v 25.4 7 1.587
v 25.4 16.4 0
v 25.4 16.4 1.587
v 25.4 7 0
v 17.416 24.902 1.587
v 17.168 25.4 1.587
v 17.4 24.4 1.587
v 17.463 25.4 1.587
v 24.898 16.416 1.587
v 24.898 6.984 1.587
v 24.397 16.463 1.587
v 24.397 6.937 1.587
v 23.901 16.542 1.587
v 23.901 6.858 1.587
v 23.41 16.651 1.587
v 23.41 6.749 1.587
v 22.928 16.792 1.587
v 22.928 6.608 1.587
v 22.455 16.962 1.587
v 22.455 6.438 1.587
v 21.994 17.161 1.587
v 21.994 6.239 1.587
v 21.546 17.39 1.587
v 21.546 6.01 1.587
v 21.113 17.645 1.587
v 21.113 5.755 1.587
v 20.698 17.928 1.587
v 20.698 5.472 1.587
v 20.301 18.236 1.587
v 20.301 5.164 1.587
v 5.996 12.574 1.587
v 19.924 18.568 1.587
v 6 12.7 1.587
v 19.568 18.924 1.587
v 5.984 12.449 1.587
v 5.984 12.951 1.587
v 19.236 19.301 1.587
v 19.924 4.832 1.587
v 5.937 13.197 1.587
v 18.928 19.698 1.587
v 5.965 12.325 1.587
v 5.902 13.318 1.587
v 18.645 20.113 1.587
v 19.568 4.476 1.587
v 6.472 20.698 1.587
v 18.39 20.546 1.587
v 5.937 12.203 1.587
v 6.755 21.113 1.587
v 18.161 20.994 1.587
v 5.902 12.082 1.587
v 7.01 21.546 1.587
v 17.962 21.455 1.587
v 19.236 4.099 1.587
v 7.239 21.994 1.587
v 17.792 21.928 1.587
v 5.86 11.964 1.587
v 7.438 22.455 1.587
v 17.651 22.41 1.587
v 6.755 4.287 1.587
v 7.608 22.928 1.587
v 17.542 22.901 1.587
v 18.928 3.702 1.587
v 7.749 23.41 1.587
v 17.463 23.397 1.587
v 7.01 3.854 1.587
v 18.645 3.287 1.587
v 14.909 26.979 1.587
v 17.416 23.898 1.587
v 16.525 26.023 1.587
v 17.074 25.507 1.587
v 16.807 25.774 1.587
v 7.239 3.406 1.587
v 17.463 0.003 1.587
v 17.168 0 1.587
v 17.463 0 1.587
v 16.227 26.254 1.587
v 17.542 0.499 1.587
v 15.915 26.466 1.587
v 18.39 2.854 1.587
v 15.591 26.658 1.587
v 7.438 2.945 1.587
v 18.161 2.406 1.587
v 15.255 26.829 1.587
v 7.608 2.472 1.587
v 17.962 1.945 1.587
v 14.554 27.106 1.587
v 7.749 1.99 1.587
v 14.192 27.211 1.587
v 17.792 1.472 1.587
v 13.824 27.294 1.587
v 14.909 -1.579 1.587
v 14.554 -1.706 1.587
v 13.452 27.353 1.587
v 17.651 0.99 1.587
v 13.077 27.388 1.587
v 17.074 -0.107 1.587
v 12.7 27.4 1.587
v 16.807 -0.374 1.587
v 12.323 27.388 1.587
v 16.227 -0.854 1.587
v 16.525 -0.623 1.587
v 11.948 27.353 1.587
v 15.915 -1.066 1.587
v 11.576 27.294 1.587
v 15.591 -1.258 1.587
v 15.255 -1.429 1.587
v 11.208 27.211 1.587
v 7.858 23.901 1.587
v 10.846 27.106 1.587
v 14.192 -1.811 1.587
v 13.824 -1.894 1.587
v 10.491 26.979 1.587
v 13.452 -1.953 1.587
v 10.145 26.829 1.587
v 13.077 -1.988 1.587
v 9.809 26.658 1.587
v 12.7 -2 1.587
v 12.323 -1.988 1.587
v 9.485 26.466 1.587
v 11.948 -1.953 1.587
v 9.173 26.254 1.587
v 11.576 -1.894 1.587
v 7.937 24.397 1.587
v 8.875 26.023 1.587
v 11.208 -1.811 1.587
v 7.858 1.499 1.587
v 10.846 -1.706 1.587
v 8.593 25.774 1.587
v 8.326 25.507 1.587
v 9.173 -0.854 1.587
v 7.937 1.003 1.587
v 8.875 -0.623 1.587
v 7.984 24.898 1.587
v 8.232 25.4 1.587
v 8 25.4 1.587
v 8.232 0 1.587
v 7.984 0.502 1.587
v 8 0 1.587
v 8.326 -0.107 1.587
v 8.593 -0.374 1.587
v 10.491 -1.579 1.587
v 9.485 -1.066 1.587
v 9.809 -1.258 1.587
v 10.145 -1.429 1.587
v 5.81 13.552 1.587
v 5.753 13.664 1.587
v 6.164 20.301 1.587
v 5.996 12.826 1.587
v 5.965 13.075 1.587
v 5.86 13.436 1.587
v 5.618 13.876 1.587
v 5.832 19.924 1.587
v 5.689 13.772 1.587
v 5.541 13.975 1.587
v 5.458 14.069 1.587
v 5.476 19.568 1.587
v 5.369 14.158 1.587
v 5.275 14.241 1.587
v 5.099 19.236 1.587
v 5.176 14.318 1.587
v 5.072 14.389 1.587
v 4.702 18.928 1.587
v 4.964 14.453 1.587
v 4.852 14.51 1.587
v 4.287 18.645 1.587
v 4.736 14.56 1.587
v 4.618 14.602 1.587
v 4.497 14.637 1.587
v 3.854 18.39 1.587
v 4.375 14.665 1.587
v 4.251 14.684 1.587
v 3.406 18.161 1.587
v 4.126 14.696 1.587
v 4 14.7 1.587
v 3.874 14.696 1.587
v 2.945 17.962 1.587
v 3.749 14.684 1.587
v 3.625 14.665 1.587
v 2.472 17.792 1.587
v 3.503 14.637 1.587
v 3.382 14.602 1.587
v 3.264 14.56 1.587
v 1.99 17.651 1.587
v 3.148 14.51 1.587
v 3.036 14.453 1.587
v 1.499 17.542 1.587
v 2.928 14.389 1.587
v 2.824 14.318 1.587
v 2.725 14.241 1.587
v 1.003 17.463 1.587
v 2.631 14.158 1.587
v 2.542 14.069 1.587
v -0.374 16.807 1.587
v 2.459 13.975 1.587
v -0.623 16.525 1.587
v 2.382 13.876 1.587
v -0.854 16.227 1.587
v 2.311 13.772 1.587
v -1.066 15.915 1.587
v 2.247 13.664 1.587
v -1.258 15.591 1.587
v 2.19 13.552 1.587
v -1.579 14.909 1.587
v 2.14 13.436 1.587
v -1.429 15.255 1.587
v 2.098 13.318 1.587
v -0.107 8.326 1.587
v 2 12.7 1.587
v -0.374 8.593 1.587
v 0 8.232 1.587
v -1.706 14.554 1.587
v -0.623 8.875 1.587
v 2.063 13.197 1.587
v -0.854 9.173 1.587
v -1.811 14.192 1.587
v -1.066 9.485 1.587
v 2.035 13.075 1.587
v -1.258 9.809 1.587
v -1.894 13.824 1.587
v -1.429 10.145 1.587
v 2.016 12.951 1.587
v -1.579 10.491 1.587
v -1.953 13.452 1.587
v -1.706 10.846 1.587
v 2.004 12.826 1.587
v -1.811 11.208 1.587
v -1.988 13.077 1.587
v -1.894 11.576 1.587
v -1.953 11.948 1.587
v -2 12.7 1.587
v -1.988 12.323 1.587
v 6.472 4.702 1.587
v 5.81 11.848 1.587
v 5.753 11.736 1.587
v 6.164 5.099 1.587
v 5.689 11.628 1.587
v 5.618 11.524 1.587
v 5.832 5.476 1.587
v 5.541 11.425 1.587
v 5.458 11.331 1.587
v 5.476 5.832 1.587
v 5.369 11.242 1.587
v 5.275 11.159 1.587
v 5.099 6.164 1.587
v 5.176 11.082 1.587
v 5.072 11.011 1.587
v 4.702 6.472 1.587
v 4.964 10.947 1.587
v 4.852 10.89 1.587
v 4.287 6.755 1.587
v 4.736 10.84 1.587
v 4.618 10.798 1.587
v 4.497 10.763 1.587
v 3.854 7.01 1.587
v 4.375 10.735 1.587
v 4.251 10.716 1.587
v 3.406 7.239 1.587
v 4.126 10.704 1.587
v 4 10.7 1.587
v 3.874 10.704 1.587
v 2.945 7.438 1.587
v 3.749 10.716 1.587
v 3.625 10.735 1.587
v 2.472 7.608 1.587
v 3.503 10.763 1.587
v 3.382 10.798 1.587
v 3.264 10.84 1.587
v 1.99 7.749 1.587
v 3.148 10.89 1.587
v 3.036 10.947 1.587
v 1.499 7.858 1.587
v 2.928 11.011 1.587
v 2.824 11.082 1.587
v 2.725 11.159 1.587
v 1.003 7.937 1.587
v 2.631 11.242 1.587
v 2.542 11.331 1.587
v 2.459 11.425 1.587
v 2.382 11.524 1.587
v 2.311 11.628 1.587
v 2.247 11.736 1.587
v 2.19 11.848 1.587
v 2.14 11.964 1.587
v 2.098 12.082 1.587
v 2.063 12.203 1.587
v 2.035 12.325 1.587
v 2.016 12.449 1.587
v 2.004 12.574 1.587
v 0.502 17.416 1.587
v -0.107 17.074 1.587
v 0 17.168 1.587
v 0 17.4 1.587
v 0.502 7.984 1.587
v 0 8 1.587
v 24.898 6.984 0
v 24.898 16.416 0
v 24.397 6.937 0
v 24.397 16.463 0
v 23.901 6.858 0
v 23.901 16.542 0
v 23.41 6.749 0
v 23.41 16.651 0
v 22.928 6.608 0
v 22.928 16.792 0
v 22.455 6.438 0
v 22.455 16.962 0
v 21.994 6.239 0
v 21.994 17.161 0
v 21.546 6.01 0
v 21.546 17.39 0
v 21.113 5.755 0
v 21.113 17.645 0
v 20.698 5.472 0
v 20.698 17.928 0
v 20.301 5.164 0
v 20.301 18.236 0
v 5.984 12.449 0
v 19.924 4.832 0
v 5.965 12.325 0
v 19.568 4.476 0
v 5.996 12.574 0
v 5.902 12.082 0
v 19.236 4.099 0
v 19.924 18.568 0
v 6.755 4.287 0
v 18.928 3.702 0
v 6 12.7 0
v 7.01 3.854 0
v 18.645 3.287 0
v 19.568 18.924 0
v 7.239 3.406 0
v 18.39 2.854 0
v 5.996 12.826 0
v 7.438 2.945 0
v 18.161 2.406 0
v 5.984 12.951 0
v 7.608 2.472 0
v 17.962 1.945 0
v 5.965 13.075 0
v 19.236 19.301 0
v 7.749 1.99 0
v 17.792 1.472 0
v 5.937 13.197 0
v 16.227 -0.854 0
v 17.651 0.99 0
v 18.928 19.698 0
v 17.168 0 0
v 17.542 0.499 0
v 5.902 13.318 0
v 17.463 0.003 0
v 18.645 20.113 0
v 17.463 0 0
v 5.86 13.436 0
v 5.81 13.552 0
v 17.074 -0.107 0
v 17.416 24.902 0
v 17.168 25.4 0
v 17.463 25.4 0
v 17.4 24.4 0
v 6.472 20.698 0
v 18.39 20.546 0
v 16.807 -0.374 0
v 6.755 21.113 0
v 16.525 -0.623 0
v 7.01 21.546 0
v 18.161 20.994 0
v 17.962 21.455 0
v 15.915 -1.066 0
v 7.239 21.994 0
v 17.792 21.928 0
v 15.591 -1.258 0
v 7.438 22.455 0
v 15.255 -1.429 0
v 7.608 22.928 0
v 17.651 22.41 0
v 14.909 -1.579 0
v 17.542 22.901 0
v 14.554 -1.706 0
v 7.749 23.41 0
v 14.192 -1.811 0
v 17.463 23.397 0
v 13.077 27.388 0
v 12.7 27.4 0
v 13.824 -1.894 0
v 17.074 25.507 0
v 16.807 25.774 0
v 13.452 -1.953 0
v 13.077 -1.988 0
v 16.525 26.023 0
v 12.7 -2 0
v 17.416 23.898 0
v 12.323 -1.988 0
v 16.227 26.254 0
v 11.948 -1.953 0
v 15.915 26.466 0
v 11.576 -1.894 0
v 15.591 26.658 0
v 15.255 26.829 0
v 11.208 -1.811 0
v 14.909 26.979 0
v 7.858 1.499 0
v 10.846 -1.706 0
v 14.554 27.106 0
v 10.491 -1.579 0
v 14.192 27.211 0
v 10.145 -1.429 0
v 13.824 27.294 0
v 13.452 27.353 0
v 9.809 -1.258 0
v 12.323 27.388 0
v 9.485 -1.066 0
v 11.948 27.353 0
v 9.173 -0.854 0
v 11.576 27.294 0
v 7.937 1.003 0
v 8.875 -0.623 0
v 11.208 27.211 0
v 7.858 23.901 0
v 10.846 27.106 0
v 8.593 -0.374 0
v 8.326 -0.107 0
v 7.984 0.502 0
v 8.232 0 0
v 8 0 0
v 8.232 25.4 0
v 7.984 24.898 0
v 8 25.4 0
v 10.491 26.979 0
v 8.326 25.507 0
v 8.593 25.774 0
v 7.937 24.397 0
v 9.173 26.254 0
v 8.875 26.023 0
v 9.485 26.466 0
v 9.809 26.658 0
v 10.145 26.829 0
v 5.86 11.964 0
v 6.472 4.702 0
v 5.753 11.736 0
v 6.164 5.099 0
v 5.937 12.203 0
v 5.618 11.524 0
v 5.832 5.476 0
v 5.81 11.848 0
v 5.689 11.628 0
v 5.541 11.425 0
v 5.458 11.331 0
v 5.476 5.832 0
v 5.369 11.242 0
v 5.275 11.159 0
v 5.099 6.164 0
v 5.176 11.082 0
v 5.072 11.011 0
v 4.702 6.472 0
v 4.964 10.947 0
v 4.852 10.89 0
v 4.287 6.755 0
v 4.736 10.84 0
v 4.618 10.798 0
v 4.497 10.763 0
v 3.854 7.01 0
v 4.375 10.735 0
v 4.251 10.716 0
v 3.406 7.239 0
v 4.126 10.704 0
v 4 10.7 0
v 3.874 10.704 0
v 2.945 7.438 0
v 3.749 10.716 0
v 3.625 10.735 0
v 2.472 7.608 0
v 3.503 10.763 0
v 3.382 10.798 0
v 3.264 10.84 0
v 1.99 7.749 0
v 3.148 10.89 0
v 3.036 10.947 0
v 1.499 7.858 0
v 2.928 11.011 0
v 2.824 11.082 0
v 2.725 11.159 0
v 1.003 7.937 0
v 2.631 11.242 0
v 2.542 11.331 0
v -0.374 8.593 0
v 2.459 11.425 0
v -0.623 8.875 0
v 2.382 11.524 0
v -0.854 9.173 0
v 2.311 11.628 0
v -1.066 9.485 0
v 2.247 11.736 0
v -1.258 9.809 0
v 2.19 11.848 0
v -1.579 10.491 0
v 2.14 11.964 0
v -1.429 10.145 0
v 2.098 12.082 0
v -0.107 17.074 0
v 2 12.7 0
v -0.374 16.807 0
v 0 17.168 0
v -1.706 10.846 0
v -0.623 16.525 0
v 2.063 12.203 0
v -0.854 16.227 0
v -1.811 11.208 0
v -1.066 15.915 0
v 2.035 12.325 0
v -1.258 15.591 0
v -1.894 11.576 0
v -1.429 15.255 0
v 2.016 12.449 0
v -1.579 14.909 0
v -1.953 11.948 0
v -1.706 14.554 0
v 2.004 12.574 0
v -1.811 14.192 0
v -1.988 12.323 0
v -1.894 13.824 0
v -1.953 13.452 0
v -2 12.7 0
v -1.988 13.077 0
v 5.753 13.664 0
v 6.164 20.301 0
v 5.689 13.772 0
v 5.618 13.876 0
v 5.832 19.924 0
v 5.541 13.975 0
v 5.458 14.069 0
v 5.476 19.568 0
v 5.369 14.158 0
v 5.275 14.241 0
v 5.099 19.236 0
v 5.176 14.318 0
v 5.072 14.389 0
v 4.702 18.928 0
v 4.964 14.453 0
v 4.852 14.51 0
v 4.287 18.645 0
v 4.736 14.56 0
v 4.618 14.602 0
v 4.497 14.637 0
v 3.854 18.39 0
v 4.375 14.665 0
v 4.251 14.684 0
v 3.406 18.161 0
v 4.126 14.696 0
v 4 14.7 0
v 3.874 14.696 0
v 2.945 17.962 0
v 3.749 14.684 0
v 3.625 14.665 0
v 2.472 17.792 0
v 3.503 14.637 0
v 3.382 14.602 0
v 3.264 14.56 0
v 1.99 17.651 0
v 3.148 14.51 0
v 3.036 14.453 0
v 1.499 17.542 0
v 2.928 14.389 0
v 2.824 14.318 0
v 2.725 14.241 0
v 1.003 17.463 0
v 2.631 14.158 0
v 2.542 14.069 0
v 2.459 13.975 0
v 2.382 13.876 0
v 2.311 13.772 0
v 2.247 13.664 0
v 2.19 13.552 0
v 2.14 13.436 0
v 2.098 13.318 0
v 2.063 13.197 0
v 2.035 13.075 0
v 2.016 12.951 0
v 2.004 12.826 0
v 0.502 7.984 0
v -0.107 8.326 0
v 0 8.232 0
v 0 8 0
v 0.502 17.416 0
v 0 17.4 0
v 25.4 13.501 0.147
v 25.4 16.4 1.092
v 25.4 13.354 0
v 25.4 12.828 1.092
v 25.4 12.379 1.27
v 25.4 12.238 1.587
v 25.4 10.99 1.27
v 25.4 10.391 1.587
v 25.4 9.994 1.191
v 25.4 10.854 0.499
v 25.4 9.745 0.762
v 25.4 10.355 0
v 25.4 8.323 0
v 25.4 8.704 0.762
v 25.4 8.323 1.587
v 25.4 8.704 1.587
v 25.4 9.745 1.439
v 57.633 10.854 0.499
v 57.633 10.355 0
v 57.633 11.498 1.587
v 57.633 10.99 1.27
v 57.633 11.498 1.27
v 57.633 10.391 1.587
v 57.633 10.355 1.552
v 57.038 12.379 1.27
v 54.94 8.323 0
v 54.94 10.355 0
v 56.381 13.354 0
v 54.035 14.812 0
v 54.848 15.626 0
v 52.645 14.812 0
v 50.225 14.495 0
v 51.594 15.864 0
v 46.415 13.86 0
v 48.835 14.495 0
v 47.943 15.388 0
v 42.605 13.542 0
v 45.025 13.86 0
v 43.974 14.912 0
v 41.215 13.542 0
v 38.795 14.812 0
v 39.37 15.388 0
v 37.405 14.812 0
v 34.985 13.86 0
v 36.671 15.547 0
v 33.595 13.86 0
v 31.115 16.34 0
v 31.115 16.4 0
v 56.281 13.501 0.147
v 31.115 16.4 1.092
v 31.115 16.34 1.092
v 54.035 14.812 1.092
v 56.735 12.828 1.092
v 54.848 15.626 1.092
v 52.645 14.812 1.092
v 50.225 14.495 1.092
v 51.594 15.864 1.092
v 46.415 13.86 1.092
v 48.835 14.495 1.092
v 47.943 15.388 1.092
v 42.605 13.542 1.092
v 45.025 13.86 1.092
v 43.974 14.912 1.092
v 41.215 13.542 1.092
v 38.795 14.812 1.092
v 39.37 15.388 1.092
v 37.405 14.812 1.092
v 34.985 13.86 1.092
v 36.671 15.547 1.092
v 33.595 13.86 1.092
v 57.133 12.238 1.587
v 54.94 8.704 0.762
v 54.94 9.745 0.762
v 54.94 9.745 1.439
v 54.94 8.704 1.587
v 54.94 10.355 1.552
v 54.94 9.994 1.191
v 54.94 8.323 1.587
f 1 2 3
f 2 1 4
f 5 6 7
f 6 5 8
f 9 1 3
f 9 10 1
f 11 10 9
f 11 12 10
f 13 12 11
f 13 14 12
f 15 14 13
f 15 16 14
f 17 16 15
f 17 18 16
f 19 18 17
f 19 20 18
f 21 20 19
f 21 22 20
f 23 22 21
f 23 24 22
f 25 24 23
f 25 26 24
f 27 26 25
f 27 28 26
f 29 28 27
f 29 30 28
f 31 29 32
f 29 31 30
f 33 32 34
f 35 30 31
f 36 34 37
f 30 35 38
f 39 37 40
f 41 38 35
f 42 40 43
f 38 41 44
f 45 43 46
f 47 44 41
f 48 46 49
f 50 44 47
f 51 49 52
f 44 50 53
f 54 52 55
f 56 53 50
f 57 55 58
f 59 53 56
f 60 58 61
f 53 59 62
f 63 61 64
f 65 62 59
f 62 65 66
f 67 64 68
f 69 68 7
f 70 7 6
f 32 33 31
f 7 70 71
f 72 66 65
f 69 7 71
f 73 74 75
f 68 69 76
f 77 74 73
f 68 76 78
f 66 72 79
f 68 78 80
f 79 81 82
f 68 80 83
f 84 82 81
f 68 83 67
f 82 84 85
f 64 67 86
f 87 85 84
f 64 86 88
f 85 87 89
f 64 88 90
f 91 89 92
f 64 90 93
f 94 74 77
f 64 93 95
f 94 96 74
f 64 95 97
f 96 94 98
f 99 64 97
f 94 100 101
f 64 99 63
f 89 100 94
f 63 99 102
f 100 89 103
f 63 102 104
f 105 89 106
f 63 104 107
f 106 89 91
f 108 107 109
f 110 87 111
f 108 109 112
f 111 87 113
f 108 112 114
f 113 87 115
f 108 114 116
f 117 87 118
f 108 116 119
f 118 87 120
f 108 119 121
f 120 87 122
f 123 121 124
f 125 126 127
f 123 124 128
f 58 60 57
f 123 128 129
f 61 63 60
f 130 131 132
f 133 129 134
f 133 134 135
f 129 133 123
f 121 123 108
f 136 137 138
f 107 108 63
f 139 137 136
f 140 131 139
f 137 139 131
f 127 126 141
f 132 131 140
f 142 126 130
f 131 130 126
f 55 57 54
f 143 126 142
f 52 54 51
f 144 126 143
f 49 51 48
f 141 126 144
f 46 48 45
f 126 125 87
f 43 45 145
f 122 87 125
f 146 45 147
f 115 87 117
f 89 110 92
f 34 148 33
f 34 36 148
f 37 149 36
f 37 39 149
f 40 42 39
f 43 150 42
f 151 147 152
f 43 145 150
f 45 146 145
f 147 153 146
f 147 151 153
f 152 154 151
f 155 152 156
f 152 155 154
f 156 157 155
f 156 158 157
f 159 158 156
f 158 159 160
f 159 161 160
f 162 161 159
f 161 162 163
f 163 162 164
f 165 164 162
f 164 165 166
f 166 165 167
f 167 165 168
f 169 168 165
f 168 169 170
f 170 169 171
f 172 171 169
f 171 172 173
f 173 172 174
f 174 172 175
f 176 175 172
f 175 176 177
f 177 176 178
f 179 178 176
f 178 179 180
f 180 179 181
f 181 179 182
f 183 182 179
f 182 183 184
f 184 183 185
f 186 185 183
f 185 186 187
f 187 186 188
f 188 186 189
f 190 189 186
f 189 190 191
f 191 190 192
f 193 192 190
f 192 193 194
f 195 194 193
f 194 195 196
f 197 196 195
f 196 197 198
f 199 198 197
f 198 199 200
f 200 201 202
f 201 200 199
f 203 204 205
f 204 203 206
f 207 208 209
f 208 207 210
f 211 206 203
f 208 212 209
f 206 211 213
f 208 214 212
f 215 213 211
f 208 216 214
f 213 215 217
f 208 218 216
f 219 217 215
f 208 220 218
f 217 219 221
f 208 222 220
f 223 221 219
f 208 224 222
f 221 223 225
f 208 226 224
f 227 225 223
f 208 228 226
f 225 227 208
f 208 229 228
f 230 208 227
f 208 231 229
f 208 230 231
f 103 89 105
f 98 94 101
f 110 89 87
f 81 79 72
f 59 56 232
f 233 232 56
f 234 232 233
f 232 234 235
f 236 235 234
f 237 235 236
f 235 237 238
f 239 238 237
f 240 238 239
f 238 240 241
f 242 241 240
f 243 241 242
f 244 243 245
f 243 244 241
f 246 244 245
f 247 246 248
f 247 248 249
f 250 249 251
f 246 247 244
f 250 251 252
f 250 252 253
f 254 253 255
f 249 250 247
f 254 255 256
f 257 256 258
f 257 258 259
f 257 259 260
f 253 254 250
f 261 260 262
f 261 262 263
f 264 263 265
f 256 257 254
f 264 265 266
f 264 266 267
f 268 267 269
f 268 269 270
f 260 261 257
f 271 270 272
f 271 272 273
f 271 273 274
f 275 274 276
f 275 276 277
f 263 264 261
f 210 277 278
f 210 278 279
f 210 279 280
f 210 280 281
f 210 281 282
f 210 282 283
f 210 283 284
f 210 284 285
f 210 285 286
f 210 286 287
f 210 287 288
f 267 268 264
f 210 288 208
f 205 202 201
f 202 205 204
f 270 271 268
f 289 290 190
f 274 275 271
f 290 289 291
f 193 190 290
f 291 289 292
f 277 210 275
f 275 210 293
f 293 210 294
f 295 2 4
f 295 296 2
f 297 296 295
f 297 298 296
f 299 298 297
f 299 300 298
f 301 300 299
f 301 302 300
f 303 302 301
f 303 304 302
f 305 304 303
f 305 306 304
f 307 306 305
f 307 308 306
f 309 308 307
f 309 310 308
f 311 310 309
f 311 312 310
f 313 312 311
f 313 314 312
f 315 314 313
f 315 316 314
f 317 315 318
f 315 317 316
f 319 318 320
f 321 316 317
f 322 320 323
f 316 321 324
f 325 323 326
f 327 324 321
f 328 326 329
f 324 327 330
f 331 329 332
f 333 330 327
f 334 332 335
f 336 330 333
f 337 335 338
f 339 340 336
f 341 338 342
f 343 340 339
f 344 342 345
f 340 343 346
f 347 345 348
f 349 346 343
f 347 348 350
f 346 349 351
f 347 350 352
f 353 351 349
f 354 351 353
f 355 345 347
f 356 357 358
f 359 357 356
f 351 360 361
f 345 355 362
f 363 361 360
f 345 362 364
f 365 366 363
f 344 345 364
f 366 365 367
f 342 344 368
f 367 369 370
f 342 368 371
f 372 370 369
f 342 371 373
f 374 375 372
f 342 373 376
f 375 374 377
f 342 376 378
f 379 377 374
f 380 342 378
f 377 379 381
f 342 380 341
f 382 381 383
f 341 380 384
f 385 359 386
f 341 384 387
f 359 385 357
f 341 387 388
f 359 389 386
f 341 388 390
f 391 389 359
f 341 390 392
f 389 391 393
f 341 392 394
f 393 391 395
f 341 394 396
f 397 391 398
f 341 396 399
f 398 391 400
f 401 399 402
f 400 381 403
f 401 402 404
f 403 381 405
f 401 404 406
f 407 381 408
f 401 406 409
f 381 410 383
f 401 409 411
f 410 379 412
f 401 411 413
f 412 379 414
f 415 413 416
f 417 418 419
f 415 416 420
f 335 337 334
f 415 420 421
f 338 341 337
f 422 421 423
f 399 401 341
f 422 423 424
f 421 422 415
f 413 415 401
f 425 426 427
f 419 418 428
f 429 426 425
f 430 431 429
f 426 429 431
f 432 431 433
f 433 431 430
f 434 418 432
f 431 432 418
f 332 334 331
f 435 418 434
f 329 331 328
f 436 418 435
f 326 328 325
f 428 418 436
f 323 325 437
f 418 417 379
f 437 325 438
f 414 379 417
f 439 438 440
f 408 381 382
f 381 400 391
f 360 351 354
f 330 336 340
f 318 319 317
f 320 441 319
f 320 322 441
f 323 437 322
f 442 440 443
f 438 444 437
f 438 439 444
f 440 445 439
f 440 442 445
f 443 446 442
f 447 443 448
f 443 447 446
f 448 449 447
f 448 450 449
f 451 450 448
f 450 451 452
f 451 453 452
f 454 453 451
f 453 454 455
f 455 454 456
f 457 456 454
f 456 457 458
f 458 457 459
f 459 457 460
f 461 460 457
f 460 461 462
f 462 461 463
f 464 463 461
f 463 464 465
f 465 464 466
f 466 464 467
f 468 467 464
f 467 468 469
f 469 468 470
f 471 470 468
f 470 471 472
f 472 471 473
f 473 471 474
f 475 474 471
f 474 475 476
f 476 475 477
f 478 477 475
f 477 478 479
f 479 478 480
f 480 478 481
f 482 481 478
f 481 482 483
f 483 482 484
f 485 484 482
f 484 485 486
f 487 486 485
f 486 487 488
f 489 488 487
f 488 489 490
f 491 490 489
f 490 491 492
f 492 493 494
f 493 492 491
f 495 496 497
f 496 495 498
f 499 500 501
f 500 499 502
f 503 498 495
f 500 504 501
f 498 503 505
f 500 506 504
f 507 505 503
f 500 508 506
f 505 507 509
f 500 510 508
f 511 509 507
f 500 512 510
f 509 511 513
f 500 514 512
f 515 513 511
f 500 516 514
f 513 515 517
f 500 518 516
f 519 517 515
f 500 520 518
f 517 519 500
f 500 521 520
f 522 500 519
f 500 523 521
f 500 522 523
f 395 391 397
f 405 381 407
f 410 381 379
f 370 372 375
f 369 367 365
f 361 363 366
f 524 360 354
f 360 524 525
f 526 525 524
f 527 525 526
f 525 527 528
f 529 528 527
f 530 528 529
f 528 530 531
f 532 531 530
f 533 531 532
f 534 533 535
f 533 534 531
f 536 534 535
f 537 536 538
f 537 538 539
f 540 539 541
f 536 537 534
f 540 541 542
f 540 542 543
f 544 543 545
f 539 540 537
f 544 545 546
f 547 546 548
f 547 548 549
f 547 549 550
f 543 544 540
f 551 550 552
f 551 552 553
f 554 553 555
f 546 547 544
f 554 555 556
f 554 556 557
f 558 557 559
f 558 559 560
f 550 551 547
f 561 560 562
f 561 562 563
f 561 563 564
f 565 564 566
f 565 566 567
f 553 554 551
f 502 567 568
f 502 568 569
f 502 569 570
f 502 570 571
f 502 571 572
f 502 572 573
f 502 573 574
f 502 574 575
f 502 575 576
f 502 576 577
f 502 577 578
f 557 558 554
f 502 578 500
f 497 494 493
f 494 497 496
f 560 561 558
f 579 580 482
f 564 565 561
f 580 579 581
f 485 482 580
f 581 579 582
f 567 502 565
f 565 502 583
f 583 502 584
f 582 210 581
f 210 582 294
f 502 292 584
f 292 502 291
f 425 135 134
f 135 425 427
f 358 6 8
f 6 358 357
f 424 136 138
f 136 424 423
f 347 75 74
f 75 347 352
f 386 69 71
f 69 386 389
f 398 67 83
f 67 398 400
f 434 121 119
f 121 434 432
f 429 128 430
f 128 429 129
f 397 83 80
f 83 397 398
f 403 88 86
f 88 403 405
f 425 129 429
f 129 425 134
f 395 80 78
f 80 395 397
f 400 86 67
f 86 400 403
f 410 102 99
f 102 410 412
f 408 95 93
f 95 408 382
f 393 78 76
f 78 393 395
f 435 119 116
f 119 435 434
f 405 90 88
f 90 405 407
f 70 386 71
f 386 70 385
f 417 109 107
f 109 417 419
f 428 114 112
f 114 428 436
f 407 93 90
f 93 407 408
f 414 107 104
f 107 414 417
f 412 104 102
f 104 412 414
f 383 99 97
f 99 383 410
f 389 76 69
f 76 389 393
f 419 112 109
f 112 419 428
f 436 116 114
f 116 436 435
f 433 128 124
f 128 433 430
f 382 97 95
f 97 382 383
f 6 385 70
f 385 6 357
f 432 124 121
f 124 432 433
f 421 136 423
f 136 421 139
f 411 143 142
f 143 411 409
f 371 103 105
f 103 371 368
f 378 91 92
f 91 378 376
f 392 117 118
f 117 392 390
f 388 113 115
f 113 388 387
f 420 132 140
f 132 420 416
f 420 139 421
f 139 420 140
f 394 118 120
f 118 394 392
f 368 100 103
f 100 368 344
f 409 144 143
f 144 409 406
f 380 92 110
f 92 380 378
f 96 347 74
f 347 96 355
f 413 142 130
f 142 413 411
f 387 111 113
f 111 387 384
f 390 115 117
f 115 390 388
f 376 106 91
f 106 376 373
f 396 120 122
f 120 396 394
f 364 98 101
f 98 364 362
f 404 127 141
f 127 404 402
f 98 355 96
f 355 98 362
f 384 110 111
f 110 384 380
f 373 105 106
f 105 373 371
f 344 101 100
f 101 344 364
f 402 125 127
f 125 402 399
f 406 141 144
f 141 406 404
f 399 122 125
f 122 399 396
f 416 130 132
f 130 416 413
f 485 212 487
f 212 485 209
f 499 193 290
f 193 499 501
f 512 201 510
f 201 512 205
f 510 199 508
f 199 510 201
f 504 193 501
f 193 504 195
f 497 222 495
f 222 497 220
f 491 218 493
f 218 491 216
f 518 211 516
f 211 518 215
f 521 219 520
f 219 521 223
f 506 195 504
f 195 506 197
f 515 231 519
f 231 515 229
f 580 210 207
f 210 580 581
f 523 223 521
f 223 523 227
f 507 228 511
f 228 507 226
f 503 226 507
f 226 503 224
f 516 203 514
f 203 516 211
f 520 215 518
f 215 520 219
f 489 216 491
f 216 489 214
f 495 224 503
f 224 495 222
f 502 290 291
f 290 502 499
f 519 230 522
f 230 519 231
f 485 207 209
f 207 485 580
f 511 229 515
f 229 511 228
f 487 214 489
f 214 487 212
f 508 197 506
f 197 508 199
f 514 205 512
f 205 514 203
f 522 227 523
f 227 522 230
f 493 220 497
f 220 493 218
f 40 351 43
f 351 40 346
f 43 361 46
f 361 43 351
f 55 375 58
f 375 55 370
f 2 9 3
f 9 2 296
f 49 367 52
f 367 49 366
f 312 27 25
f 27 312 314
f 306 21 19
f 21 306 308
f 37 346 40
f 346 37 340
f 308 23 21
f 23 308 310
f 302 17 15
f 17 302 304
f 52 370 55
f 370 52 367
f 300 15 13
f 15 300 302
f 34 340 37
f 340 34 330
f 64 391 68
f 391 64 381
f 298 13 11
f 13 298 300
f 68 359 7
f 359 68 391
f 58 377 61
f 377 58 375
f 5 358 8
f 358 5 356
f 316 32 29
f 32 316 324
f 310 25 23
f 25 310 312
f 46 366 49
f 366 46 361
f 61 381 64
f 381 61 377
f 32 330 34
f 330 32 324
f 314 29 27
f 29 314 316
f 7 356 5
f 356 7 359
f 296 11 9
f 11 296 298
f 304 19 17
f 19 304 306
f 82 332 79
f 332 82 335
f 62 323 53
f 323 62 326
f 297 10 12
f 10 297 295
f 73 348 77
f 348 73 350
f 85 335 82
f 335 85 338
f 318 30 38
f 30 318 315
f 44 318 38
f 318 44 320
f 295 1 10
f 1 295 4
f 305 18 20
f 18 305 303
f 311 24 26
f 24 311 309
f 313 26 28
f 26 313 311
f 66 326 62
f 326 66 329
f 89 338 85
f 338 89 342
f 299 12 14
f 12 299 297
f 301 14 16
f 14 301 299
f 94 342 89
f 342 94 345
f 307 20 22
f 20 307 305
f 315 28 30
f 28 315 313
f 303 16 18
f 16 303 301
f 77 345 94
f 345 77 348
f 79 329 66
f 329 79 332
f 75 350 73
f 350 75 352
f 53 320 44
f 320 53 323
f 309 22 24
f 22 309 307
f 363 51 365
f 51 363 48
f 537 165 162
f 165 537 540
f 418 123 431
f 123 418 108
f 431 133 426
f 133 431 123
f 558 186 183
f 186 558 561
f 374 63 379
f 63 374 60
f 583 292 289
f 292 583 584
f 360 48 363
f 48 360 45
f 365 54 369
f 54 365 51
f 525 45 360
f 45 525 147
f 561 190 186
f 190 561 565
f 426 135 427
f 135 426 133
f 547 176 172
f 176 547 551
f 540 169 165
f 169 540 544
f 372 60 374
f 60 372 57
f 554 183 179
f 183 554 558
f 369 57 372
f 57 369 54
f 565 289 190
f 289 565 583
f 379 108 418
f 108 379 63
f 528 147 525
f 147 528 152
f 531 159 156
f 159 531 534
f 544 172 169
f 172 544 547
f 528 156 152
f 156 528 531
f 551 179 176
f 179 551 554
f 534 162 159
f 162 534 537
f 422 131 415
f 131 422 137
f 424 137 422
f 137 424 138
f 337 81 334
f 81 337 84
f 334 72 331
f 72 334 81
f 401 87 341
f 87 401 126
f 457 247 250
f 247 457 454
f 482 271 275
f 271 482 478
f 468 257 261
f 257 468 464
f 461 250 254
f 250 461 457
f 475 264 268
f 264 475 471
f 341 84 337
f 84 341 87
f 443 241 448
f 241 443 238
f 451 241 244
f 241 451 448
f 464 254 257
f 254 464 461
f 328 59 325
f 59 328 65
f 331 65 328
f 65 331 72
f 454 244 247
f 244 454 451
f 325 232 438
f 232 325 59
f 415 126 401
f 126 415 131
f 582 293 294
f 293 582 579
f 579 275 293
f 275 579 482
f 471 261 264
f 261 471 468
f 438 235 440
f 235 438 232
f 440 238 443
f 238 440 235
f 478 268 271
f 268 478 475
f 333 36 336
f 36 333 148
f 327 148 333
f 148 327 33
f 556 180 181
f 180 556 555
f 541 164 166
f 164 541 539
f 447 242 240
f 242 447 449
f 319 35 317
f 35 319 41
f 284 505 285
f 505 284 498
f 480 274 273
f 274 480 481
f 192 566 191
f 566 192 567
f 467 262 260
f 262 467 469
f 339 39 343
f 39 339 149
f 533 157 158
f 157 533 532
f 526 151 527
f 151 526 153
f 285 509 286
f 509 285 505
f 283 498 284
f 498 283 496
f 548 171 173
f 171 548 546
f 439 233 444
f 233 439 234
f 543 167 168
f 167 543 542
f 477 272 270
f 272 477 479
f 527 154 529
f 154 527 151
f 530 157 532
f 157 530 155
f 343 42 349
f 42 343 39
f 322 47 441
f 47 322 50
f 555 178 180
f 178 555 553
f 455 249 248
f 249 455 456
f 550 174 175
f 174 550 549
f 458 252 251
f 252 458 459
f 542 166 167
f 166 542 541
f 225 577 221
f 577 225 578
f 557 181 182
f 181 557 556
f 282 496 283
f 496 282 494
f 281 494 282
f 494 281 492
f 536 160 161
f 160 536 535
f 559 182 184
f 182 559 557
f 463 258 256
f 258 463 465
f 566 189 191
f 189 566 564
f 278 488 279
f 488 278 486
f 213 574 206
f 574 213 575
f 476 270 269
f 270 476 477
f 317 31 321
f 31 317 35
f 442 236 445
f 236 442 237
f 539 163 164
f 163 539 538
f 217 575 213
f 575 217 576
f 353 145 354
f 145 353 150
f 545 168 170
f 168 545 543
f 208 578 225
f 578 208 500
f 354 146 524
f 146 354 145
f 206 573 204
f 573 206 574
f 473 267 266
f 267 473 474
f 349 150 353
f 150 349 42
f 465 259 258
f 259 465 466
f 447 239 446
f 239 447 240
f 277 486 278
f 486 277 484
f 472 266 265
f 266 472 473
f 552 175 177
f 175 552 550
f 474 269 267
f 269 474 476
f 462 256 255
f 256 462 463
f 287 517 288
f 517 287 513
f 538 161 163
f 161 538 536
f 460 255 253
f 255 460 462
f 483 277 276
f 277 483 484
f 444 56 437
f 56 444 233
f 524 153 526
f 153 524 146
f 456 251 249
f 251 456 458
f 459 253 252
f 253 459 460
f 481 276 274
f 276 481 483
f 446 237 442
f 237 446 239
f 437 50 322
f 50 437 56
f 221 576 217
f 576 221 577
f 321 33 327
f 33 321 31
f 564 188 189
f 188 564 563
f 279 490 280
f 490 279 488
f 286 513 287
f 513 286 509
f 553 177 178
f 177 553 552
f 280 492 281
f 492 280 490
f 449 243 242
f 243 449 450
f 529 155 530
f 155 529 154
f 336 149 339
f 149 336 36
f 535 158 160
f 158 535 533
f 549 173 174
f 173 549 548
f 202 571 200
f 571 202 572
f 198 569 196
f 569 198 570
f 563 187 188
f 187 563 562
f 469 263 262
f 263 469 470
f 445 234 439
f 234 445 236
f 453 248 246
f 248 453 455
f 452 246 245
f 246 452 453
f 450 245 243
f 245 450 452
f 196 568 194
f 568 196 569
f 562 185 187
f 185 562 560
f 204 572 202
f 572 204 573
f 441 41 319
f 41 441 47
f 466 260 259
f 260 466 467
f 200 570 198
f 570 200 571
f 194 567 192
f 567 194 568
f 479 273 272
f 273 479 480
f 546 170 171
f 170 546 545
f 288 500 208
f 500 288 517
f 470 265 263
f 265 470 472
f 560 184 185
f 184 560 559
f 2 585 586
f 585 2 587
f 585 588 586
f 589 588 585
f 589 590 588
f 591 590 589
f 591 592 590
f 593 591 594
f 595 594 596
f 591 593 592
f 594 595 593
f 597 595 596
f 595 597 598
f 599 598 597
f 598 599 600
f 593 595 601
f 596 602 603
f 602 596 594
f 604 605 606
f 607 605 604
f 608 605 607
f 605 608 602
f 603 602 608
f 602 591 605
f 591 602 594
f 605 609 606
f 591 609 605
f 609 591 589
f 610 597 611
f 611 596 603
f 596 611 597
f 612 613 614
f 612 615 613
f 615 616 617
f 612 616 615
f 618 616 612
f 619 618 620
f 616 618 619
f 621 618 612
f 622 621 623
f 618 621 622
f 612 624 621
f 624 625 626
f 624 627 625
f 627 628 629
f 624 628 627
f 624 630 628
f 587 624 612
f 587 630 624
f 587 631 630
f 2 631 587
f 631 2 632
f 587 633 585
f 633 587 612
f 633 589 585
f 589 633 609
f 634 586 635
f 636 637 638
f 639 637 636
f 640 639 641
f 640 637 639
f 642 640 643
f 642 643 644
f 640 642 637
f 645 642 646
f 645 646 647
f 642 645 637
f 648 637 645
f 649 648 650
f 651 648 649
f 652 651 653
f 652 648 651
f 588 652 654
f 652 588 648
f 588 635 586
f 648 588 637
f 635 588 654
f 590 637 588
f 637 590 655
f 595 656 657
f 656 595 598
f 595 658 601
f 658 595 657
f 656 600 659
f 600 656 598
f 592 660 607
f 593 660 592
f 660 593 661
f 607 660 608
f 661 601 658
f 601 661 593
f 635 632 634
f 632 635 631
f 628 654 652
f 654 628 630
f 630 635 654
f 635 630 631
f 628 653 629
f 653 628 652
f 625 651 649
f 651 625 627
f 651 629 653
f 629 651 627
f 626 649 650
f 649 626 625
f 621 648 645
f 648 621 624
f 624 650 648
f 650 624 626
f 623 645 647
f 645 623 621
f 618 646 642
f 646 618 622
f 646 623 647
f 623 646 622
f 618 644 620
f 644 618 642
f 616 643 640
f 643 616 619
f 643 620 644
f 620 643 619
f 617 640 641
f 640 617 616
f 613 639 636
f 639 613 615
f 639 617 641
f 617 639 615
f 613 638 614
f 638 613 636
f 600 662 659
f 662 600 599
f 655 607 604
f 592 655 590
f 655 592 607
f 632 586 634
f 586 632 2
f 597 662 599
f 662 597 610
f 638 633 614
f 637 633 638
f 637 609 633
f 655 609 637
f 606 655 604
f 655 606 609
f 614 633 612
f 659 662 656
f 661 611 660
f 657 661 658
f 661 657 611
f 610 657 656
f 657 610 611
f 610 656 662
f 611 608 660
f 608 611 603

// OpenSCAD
//BEST G - Model

$fn=100;

function mm(i) = i*25.4;

module bow(bow_length, bow_width, bow_thickness)
{
	difference()
	{
		union()
		{
			cube([bow_length, bow_width, bow_thickness]);

			//Place cylinders on the top and bottom of the bow for style

			//Top middle
			translate([bow_length / 2, bow_width - 4, 0]) cylinder(h = bow_thickness, r = 6);

			//Bottom middle
			translate([bow_length / 2, 4, 0]) cylinder(h = bow_thickness, r = 6);

			//Left
			translate([4, bow_width / 2, 0]) cylinder(h = bow_thickness, r = 6);
		}

		//Place cylinders around the edges to create a more contoured design

		//Right top
		translate([bow_length, bow_width - 1, 0]) cylinder(h = bow_thickness, r = 8);

		//Right bottom
		//Positioned -1 from the axis to create a bow stop
		translate([bow_length, -1 , 0]) cylinder(h = bow_thickness, r = 8);
		
		//Left top
		translate([0, bow_width, 0]) cylinder(h = bow_thickness, r = 8);
	
		//Left bottom
		translate([0, 0, 0]) cylinder(h = bow_thickness, r = 8);

		//Place hole for keychain use
		translate([4, bow_width / 2, 0]) cylinder(h = bow_thickness, r = 2);
	}
}

module bit()
{
	w = mm(1/4);
	difference() 
	{
		translate([-w/2, 0, 0]) cube([w, mm(1), w]);
		translate([-mm(7/256), 0, 0]) rotate([0, 0, 135]) cube([w, w, w]);
		translate([mm(7/256), 0, 0]) rotate([0, 0, -45]) cube([w, w, w]);
	}
}

module blade(blade_length, blade_width, blade_thickness, key_cuts, shoulder, cut_spacing, cut_depth)
{
	difference()
	{
		cube([blade_length, blade_width, blade_thickness]);

		//Contour tip		
		translate([blade_length, mm(1/8), 0]) {
			rotate([0, 0, 34]) cube([10, 10, blade_thickness]);
		}

		//Tip stop
		translate([blade_length - mm(.106), 0, 0]) {
			cube([mm(.106), mm(.08), blade_thickness]);
		}
		
		//Cut the key channels
		union() 
		{	
			translate([0, mm(.105), mm(.025)]) rotate([225, 0, 0]) cube([blade_length, blade_width, blade_width]);
			translate([0, mm(.105), mm(.05)]) rotate([260, 0, 0]) cube([blade_length, blade_thickness / 2, mm(1/32)]);
			translate([0, mm(.105), 0]) cube([blade_length, mm(7/128), mm(.05)]);
			translate([0, mm(.105) + mm(7/128), mm(.05)]) rotate([225, 0, 0]) cube([blade_length, mm(3/64), blade_thickness]);
		}
        
		translate([0, blade_width - mm(9/64), mm(.043)]) 
		{
			cube([blade_length, mm(10/64), blade_thickness]);
			rotate([50, 0, 0]) cube([blade_length, blade_width, blade_thickness]);
		}
        
		union() {
			translate([0, mm(0.015), mm(.03)]) cube([blade_length, mm(.041), blade_thickness]);
			translate([0, mm(0.015) + mm(13/256), blade_thickness - mm(1/64)]) rotate([45, 0, 0]) cube([blade_length, mm(1/16), mm(1/16)]);
		}

		//Cut the blade
		for (counter = [0:6]) 
		{
			translate([shoulder + (counter * cut_spacing), blade_width - (key_cuts[counter]) * cut_depth, 0]) bit();
		}
	}
}

module best_g(key_cuts) 
{
	blade_length = mm(1.269);
	blade_width = mm(.318);
	blade_thickness = mm(0.080);

	shoulder = mm(0.2);
	cut_spacing = mm(.15);
	cut_depth = mm(.0125);
    
	bow_length = mm(1);
	bow_width = mm(1);
	bow_thickness = mm(1/16);

	union()
	{
		bow(bow_length, bow_width, bow_thickness); 
		translate([bow_length, bow_width - blade_width - 9, 0]) blade(blade_length, blade_width, bow_thickness, key_cuts, shoulder, cut_spacing, cut_depth);
	}
}

best_g([0, 8, 5, 9, 8, 6, 5]);
